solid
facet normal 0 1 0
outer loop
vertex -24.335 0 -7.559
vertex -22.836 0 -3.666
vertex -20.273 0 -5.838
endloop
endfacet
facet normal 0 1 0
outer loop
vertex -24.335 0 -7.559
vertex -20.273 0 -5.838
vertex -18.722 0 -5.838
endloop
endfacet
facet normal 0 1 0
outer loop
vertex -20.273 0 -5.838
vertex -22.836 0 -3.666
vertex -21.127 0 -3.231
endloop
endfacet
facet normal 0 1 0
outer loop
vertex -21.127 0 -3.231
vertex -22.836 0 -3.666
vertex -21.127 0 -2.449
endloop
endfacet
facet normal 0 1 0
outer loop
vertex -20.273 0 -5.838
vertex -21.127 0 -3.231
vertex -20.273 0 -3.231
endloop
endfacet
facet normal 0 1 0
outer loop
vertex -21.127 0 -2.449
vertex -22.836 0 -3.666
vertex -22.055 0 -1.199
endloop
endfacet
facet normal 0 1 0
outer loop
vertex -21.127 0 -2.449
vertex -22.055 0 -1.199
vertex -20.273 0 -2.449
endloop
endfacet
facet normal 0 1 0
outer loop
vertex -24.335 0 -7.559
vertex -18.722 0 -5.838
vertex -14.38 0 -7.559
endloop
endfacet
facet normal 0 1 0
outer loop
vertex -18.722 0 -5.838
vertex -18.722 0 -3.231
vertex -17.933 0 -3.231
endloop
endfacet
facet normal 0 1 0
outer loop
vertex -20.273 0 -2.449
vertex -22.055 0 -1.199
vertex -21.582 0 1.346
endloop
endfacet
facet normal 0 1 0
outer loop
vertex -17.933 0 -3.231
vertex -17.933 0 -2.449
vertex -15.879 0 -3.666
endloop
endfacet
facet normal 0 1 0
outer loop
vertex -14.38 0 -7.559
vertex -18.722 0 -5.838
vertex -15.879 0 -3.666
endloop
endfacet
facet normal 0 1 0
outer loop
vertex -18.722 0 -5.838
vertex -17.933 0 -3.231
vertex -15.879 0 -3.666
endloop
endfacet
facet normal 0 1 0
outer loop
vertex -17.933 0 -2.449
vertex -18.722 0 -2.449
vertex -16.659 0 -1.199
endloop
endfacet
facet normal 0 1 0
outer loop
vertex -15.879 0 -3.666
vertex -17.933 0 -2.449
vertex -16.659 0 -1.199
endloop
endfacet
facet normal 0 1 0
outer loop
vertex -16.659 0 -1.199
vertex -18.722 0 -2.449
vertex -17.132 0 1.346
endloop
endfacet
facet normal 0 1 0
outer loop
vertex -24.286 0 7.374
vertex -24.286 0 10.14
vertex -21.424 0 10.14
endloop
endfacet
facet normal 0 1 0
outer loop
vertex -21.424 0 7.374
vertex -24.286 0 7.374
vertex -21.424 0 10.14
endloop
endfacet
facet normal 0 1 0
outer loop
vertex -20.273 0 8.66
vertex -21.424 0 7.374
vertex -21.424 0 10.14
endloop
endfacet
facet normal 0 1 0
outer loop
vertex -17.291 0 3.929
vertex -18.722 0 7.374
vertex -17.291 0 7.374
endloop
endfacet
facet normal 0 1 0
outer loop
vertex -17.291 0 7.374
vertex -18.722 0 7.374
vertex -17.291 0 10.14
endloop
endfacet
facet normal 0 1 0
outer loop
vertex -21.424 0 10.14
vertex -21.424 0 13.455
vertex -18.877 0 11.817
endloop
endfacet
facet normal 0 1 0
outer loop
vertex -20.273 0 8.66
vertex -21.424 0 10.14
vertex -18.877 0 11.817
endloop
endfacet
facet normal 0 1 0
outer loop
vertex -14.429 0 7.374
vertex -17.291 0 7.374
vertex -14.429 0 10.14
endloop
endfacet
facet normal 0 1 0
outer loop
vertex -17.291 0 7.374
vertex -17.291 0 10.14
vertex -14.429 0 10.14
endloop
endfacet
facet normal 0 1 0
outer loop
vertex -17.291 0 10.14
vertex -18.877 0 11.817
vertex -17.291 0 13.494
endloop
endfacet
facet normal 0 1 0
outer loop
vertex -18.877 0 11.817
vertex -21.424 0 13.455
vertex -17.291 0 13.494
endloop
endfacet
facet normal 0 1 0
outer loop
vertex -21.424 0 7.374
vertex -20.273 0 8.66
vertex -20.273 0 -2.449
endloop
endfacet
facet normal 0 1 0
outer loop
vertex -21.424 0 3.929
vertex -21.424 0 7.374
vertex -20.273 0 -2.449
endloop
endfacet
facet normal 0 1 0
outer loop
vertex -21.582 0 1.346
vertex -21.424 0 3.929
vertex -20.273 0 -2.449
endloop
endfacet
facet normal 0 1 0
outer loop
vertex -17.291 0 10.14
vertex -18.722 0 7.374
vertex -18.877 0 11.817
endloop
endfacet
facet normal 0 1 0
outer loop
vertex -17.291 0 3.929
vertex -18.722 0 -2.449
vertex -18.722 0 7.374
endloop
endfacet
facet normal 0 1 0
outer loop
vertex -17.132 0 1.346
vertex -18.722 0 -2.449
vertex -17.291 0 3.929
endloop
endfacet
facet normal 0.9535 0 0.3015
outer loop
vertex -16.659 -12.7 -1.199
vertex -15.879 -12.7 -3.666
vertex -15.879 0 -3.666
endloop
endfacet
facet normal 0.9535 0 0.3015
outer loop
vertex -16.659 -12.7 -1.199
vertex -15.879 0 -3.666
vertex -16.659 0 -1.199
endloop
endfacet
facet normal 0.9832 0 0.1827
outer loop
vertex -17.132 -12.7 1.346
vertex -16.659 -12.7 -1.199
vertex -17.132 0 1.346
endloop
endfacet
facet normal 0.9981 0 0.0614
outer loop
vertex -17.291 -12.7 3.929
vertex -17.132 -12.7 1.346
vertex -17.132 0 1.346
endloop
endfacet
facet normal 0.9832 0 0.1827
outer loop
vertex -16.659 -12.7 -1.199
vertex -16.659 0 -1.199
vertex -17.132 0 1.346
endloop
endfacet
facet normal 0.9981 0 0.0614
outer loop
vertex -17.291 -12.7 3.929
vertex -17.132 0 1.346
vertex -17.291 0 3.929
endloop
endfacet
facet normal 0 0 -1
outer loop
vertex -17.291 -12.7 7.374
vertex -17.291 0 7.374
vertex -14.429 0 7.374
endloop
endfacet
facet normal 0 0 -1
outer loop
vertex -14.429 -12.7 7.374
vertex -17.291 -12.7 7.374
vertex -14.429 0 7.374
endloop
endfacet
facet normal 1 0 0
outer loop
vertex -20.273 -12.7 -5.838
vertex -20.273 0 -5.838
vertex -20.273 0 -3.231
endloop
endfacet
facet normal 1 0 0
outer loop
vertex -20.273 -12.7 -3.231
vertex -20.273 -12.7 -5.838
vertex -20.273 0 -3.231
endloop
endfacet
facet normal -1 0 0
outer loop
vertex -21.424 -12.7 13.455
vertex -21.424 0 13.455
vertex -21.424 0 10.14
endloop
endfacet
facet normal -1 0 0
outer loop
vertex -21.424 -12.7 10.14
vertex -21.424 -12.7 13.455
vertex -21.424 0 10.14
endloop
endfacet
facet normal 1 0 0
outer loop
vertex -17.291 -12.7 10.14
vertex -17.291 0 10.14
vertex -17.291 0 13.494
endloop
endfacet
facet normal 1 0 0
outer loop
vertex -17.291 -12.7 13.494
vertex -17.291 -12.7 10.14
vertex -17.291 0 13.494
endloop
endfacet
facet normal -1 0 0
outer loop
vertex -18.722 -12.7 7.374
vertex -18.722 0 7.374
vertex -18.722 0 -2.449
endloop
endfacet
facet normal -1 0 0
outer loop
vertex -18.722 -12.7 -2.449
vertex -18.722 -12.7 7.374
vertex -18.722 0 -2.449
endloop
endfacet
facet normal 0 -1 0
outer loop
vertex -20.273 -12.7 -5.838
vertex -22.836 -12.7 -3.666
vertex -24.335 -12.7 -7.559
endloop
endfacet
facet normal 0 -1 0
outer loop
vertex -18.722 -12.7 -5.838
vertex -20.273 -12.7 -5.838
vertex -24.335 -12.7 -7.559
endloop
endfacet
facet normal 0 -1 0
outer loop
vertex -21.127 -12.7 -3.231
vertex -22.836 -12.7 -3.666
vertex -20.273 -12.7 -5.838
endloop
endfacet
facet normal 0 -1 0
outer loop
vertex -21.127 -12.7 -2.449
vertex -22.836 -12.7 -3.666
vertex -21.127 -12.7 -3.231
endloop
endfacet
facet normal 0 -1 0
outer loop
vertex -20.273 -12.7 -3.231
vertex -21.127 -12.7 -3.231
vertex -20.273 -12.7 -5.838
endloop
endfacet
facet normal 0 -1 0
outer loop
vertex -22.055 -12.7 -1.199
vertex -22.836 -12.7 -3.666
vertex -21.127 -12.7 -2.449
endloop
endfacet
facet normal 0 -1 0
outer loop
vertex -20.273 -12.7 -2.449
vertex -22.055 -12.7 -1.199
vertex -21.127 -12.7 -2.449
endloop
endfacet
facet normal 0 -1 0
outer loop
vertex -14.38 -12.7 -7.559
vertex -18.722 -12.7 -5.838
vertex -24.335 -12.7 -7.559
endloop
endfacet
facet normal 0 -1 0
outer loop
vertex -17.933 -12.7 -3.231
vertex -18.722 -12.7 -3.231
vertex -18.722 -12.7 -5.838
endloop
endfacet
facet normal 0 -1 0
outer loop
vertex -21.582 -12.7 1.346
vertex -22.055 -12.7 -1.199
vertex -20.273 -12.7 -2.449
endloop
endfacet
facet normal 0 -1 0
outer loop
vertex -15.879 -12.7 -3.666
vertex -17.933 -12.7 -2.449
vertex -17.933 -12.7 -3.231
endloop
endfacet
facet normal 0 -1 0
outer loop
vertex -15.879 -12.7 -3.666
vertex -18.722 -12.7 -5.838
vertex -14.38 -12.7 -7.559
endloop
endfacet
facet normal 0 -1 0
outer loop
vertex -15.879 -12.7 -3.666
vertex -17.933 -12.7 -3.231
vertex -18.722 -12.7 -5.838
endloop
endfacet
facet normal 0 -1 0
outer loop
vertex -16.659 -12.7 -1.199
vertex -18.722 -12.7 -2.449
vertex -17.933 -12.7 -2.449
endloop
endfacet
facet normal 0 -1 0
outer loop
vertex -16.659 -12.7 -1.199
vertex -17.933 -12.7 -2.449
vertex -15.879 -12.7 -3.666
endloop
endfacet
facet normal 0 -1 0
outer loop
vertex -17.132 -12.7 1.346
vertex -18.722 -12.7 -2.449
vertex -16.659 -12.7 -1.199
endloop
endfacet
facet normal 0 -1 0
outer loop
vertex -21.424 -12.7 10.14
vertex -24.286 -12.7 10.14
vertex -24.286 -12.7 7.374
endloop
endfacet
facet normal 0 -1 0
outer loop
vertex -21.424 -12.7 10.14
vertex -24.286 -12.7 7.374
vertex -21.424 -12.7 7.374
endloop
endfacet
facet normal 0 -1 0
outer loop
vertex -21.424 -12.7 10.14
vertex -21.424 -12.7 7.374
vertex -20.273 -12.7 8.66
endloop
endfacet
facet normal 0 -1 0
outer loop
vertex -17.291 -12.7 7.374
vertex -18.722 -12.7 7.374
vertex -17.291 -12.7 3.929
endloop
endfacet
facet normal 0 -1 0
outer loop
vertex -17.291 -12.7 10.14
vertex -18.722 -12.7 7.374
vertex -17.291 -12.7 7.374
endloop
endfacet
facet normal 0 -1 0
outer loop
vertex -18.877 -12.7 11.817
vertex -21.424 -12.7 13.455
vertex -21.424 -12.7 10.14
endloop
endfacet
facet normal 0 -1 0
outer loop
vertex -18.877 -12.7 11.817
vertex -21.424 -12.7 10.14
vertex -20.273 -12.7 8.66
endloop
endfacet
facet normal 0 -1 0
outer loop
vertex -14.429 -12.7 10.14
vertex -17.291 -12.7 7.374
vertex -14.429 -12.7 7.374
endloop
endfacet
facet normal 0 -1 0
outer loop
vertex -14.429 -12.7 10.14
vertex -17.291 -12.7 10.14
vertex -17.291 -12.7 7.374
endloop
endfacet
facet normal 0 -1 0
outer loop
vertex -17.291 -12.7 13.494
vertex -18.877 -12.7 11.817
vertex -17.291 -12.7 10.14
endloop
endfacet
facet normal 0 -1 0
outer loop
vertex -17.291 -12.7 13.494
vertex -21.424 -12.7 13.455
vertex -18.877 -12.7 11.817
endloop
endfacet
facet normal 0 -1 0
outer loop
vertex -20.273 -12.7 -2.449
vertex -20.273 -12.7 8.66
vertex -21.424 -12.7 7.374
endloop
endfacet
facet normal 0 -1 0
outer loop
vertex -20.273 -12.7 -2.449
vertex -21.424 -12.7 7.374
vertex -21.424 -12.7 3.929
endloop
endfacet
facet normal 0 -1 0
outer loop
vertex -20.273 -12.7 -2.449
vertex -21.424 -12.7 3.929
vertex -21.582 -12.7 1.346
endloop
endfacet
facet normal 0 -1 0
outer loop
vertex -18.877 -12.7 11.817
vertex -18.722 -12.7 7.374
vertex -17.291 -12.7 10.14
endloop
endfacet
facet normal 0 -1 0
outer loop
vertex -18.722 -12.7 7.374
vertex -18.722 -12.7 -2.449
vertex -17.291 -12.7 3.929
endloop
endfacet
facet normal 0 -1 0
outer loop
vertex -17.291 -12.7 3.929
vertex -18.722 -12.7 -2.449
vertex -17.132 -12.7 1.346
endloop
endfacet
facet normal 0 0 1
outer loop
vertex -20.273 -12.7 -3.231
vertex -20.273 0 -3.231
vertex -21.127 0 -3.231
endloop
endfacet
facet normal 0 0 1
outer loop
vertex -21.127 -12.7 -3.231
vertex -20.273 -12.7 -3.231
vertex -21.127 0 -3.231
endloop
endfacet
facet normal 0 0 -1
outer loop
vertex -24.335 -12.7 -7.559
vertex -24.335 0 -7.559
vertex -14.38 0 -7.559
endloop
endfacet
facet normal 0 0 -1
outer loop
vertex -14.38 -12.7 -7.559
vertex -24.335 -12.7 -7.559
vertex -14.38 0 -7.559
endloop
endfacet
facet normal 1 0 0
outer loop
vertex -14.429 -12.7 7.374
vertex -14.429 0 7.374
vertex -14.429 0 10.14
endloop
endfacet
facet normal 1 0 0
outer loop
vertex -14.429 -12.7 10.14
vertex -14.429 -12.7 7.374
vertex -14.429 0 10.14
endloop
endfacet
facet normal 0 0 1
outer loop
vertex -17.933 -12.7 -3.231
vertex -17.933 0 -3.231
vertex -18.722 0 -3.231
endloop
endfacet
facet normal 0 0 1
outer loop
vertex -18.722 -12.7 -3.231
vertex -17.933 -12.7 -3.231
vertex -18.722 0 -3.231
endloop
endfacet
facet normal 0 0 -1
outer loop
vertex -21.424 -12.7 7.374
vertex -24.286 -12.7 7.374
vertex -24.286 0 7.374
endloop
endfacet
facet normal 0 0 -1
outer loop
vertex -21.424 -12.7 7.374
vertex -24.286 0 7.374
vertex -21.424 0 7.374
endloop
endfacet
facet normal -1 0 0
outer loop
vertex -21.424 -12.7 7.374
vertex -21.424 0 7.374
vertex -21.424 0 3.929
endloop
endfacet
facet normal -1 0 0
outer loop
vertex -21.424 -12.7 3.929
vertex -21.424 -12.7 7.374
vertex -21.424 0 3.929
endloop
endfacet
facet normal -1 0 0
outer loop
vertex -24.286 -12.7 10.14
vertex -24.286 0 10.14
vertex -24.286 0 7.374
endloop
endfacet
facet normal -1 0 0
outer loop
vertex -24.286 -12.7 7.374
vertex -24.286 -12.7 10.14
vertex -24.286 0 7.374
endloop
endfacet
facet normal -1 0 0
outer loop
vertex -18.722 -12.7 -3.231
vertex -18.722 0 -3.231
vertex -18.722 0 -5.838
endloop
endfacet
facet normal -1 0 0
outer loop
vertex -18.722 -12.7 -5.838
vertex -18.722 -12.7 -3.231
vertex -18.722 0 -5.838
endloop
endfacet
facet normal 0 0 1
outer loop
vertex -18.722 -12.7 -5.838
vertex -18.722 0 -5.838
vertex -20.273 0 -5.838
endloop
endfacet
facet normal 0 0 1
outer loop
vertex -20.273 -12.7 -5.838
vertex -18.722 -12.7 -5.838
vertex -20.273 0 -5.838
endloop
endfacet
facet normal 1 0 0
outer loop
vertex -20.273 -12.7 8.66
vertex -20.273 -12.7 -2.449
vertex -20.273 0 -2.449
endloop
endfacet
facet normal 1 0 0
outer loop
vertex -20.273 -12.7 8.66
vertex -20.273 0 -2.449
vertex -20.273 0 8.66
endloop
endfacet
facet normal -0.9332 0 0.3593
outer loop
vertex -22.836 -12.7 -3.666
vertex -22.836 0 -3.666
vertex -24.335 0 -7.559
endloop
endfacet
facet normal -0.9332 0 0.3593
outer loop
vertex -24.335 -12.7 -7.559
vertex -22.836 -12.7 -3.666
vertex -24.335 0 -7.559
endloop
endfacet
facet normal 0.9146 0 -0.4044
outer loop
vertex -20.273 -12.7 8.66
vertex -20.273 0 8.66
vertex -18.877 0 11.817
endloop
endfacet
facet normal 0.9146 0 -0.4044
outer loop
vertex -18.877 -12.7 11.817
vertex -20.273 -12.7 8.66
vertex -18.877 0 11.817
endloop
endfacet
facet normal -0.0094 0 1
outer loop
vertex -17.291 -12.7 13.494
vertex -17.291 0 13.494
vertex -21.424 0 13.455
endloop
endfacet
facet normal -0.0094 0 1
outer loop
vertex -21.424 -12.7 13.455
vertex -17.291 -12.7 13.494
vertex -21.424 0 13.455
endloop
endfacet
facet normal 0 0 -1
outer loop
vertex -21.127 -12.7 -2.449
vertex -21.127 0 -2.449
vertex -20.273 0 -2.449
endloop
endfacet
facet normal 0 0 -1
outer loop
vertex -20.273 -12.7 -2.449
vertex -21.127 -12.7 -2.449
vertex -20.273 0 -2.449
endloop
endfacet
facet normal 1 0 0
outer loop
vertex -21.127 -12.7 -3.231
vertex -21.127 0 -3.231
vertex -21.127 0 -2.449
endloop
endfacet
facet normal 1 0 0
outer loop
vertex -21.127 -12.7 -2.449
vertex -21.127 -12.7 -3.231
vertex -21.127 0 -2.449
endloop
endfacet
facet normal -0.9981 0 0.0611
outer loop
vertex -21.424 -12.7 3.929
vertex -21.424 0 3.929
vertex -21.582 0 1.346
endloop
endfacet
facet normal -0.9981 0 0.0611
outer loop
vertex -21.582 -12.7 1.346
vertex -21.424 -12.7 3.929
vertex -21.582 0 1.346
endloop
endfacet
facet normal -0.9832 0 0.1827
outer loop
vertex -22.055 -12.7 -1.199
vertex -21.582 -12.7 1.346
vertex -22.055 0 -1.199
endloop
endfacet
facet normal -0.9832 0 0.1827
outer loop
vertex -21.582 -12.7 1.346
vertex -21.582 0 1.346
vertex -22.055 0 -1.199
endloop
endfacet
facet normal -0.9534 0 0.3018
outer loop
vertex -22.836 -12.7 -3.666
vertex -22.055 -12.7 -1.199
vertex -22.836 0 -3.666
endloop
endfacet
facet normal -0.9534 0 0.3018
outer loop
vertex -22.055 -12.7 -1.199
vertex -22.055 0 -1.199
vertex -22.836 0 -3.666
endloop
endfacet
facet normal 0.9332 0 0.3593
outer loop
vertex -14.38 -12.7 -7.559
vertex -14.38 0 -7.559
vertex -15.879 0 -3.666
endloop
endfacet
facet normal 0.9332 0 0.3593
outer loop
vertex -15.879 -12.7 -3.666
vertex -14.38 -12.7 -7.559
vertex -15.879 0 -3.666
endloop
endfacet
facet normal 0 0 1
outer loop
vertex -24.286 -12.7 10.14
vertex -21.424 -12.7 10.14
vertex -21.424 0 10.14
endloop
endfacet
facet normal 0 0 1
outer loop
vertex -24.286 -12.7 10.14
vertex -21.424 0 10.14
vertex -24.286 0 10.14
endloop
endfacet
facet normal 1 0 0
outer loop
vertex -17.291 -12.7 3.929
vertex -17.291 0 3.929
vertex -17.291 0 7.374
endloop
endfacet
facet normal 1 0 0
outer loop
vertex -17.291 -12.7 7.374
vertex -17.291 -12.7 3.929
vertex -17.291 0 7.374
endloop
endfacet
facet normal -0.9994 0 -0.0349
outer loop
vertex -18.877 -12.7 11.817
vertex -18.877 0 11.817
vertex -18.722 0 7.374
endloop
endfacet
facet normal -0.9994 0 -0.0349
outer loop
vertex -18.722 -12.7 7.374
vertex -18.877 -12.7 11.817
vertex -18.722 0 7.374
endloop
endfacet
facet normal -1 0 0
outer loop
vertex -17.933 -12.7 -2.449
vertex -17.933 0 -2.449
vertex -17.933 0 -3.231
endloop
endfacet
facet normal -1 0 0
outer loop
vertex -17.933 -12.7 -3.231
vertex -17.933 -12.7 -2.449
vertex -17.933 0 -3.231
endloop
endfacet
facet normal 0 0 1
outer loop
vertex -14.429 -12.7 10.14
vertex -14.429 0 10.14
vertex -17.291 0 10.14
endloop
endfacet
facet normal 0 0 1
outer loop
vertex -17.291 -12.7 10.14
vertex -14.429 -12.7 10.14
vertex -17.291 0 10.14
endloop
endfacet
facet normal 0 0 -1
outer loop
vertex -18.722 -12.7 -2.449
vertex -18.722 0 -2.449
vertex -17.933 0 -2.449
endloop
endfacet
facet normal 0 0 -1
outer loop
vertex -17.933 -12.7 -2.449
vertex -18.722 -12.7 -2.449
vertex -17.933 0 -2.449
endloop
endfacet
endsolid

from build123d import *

# Parameters (mm, degrees)
F1_DEPTH = 12.7


with BuildPart() as f1:
    # F0 (on Front) → F1 (new body)
    with BuildSketch(Plane.XZ):
        with BuildLine():
            Line((-24.285673, 10.139517), (-24.285673, 7.374194))
            Line((-24.285673, 7.374194), (-21.424013, 7.374194))
            Line((-21.424013, 7.374194), (-21.424013, 3.928539))
            ThreePointArc((-21.424013, 3.928539), (-21.779967, 0.066171), (-22.835836, -3.666084))
            Line((-22.835836, -3.666084), (-24.334839, -7.558548))
            Line((-24.334839, -7.558548), (-14.379678, -7.558548))
            Line((-14.379678, -7.558548), (-15.878681, -3.666084))
            ThreePointArc((-15.878681, -3.666084), (-16.93455, 0.066171), (-17.290504, 3.928539))
            Line((-17.290504, 3.928539), (-17.290504, 7.374194))
            Line((-17.290504, 7.374194), (-14.428843, 7.374194))
            Line((-14.428843, 7.374194), (-14.428843, 10.139517))
            Line((-14.428843, 10.139517), (-17.290504, 10.139517))
            Line((-17.290504, 10.139517), (-17.290504, 13.493787))
            Line((-17.290504, 13.493787), (-21.424013, 13.455031))
            Line((-21.424013, 13.455031), (-21.424013, 10.139517))
            Line((-21.424013, 10.139517), (-24.285673, 10.139517))
        make_face()
        Polygon((-20.272696, -2.44856), (-20.272696, 0), (-20.272696, 7.374194), (-20.272696, 8.660011), (-18.877488, 11.816652), (-18.722465, 7.374194), (-18.722465, 0), (-18.722465, -2.44856), (-17.933246, -2.44856), (-17.933246, -3.230711), (-18.722465, -3.230711), (-18.722465, -5.837881), (-20.272696, -5.837881), (-20.272696, -3.230711), (-21.127159, -3.230711), (-21.127159, -2.44856), align=None, mode=Mode.SUBTRACT)
    extrude(amount=F1_DEPTH)


solid = f1.part
